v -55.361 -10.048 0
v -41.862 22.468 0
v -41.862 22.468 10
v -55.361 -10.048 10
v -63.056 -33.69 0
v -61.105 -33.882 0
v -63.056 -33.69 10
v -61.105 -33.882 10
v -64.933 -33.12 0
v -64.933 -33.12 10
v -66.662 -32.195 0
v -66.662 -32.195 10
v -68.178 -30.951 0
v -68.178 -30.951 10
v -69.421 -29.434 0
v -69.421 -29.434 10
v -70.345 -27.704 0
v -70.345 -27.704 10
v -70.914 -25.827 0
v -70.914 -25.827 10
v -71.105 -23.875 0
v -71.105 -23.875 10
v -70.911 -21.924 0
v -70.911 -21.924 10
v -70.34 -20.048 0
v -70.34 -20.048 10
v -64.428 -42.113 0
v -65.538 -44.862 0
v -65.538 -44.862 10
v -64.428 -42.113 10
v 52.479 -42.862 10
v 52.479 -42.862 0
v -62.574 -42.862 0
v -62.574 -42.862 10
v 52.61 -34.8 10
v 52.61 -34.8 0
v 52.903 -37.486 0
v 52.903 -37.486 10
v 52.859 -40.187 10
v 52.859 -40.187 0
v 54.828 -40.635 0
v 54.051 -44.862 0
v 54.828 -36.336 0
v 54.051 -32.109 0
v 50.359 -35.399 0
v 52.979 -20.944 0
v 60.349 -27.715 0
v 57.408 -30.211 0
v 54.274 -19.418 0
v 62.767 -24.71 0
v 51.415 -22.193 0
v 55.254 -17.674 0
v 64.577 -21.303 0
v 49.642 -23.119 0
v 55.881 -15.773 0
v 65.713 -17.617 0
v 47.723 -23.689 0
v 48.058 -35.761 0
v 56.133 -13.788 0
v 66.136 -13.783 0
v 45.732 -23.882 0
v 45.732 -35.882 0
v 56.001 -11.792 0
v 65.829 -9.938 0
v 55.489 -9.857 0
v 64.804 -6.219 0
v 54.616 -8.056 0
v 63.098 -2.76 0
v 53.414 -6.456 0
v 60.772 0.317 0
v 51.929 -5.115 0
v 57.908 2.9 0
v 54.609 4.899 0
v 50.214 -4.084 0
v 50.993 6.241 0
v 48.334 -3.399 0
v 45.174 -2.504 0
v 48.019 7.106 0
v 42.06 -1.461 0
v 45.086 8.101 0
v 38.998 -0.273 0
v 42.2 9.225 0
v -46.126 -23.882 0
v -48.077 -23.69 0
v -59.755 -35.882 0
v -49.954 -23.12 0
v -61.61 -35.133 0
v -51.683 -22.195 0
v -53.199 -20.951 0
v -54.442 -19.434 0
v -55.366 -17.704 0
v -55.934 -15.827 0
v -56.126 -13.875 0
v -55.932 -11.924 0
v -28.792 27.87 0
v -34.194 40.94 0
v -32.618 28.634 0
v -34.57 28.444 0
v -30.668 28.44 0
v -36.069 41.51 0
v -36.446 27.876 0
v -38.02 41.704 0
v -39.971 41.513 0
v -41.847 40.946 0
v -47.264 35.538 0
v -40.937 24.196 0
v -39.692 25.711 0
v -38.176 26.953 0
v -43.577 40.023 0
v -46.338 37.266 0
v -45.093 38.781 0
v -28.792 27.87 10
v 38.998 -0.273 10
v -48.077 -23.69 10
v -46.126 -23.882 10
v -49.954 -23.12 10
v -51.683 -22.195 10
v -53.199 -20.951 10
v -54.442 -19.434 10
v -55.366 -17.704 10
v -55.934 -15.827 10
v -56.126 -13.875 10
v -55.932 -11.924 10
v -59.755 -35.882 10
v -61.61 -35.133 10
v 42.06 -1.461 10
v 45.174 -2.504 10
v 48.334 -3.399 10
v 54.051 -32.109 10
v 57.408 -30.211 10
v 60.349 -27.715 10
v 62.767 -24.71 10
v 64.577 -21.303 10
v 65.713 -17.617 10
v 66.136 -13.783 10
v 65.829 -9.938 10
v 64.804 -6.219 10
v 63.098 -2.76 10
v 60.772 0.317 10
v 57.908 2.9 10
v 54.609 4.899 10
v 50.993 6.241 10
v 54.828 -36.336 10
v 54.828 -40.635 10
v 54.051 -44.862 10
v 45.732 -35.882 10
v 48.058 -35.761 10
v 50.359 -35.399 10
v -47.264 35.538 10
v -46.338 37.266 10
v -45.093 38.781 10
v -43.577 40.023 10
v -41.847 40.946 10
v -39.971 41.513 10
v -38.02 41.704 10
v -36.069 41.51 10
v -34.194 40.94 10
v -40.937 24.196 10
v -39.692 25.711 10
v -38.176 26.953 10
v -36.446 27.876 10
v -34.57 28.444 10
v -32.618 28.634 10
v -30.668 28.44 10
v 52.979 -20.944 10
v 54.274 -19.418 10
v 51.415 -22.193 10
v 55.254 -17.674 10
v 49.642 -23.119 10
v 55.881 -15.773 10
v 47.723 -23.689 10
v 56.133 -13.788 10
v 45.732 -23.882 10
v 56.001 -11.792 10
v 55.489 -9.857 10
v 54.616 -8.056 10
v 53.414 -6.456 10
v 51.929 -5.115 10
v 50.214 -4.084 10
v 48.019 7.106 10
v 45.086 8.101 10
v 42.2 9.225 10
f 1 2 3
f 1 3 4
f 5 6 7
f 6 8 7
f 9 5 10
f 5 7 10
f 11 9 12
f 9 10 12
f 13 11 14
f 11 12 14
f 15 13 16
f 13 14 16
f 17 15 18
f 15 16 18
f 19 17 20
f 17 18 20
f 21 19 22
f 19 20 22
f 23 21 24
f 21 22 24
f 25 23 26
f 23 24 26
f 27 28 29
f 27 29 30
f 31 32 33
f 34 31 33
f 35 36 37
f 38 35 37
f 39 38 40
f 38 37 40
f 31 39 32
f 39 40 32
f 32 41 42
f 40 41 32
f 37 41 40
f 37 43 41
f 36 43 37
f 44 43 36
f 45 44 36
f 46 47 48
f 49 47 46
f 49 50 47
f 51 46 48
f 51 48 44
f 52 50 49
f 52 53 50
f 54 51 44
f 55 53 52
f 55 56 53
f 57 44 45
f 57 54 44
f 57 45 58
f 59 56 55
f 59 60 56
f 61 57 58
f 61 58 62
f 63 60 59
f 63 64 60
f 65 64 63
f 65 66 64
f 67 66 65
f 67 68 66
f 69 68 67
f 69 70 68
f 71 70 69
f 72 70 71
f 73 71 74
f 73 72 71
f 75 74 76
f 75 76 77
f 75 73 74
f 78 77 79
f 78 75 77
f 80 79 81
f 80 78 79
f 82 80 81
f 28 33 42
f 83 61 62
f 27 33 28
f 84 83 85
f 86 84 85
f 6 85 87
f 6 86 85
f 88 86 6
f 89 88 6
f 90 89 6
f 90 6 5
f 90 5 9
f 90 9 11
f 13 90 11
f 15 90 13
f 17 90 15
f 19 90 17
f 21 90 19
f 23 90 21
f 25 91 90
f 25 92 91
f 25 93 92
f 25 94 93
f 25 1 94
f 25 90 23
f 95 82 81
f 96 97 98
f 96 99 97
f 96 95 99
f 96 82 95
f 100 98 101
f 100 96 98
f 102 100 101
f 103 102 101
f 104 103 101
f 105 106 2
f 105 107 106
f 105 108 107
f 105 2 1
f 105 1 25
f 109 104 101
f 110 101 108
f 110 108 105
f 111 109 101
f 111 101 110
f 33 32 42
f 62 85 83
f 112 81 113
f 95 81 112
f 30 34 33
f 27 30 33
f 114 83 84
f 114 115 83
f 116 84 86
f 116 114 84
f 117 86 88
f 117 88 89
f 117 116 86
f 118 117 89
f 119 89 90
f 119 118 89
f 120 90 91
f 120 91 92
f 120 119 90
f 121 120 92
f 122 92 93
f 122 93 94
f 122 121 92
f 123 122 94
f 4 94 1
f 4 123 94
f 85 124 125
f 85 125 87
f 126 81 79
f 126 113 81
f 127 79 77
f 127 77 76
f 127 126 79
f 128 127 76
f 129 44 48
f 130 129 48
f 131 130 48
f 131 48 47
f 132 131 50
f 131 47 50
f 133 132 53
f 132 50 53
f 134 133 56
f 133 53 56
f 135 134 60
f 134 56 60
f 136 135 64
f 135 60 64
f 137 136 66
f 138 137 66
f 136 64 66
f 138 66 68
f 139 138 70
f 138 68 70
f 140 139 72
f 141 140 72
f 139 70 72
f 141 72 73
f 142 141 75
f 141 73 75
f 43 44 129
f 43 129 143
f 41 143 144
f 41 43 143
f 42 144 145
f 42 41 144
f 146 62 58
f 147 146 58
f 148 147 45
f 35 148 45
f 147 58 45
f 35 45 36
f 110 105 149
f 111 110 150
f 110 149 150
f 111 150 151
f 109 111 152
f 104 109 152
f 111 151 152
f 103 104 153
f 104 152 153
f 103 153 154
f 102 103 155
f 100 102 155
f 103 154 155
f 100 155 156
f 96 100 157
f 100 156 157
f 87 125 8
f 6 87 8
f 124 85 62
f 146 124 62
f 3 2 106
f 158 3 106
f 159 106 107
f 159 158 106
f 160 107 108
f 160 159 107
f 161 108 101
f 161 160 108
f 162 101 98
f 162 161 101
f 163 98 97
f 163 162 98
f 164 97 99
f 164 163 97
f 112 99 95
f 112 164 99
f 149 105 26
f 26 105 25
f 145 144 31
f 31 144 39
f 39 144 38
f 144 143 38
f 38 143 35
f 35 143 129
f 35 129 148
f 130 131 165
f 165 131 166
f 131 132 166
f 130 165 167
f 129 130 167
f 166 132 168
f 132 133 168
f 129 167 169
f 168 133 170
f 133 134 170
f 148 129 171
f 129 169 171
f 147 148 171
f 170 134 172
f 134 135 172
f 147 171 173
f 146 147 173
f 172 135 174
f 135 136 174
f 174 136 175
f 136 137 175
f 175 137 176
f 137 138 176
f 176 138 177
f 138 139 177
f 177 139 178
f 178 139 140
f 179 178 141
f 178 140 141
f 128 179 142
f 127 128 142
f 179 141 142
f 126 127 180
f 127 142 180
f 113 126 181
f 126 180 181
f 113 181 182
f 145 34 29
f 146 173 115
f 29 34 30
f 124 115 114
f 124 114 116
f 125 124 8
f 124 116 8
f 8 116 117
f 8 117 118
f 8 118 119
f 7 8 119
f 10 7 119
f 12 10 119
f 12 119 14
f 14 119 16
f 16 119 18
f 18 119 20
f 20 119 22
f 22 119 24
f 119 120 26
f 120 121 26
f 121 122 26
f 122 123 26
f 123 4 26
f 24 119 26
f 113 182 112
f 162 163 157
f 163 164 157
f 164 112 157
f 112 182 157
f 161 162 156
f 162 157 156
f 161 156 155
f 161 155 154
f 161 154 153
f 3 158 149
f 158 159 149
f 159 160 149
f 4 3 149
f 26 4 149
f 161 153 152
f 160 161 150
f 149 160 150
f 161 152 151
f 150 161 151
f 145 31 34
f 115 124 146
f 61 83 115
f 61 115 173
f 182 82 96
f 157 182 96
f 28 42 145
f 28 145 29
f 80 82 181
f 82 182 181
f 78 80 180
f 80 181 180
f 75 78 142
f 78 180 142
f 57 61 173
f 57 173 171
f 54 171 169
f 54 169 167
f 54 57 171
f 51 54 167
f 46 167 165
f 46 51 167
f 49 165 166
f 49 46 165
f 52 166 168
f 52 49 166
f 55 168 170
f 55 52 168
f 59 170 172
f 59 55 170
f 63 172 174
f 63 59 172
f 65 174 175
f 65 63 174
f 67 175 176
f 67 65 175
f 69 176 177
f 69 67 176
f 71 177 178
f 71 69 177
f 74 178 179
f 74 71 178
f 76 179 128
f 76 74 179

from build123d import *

# Parameters (mm, degrees)
BOSS_EXTRUDE3_DEPTH = 10
FILLET1_R           = 10
FILLET2_R           = 10
FILLET3_R           = 10
FILLET4_R           = 70
FILLET5_R           = 70
BOSS_EXTRUDE5_START = -10
BOSS_EXTRUDE5_DEPTH = 10
CUT_EXTRUDE1_REACH  = 123.684
SKETCH4_W           = 10
SKETCH4_H           = 7.527652991


with BuildPart() as part:
    # Sketch1 → Boss-Extrude3 (new body)
    with BuildSketch(Plane.XY):
        with BuildLine():
            Line((-76.083611013, -33.881828403), (45.731586831, -33.881828403))
            ThreePointArc((45.731586831, -33.881828403), (66.105293747, -14.631662941), (48.04052972, 6.80011497))
            Line((48.04052972, 6.80011497), (-43.429508159, 44.774039787))
            Line((-43.429508159, 44.774039787), (-76.083611013, -33.881828403))
        make_face()
        with BuildLine():
            Line((-61.104581002, -23.881828403), (45.731586831, -23.881828403))
            ThreePointArc((45.731586831, -23.881828403), (56.138081657, -13.475333577), (45.731586831, -3.068838752))
            Line((45.731586831, -3.068838752), (-38.028005668, 31.704082983))
            Line((-38.028005668, 31.704082983), (-61.104581002, -23.881828403))
        make_face(mode=Mode.SUBTRACT)
    extrude(amount=BOSS_EXTRUDE3_DEPTH)

    # Fillet1
    fillet1_edges = [part.edges().sort_by_distance(p)[0] for p in [
        (-76.083611013, -33.881828403, 5),
    ]]
    fillet(fillet1_edges, radius=FILLET1_R)

    # Fillet2
    fillet2_edges = [part.edges().sort_by_distance(p)[0] for p in [
        (-61.104581002, -23.881828403, 5),
    ]]
    fillet(fillet2_edges, radius=FILLET2_R)

    # Fillet3
    fillet3_edges = [part.edges().sort_by_distance(p)[0] for p in [
        (-38.028005668, 31.704082983, 5),
        (-43.429508159, 44.774039787, 5),
    ]]
    fillet(fillet3_edges, radius=FILLET3_R)

    # Fillet4
    fillet4_edges = [part.edges().sort_by_distance(p)[0] for p in [
        (48.04052972, 6.80011497, 5),
    ]]
    fillet(fillet4_edges, radius=FILLET4_R)

    # Fillet5
    fillet5_edges = [part.edges().sort_by_distance(p)[0] for p in [
        (45.731586831, -3.068838752, 5),
    ]]
    fillet(fillet5_edges, radius=FILLET5_R)

    # Sketch3 → Boss-Extrude5 (add)
    with BuildSketch(Plane.XY.offset(10).offset(BOSS_EXTRUDE5_START)):
        with BuildLine():
            Line((-61.104581002, -33.881828403), (45.731586831, -33.881828403))
            ThreePointArc((45.731586831, -33.881828403), (49.984539158, -33.433725987), (54.050711911, -32.109098334))
            ThreePointArc((54.050711911, -32.109098334), (54.926134679, -38.48550442), (54.050711911, -44.861910507))
            Line((54.050711911, -44.861910507), (41.297899737, -44.861910507))
            Line((41.297899737, -44.861910507), (-65.538268096, -44.861910507))
            Line((-65.538268096, -44.861910507), (-61.104581002, -33.881828403))
        make_face()
        with BuildLine():
            Line((-59.755272984, -35.881828403), (45.731586831, -35.881828403))
            ThreePointArc((45.731586831, -35.881828403), (49.213208875, -35.609680605), (52.610255818, -34.799848187))
            ThreePointArc((52.610255818, -34.799848187), (52.923282115, -38.83702206), (52.47940001, -42.861910507))
            Line((52.47940001, -42.861910507), (41.297899737, -42.861910507))
            Line((41.297899737, -42.861910507), (-62.5737856, -42.861910507))
            Line((-62.5737856, -42.861910507), (-59.755272984, -35.881828403))
        make_face(mode=Mode.SUBTRACT)
    extrude(amount=BOSS_EXTRUDE5_DEPTH)

    # Sketch4 → Cut-Extrude1 (cut, up to next)
    with BuildSketch(Plane(origin=(-38.920465473, 15.715835623, 0), x_dir=(0, 0, -1), z_dir=(0.9272587501851874, -0.37442116687629234, 0)), mode=Mode.PRIVATE) as cut_extrude1_sk1:
        with Locations((-5, -59.409204893)):
            Rectangle(SKETCH4_W, SKETCH4_H)
    cut_extrude1_tool1 = extrude(cut_extrude1_sk1.sketch, amount=-CUT_EXTRUDE1_REACH, mode=Mode.PRIVATE) & part.part
    add(cut_extrude1_tool1.solids().sort_by_distance((-61.164529, -39.371869, 5))[0], mode=Mode.SUBTRACT)


solid = part.part
